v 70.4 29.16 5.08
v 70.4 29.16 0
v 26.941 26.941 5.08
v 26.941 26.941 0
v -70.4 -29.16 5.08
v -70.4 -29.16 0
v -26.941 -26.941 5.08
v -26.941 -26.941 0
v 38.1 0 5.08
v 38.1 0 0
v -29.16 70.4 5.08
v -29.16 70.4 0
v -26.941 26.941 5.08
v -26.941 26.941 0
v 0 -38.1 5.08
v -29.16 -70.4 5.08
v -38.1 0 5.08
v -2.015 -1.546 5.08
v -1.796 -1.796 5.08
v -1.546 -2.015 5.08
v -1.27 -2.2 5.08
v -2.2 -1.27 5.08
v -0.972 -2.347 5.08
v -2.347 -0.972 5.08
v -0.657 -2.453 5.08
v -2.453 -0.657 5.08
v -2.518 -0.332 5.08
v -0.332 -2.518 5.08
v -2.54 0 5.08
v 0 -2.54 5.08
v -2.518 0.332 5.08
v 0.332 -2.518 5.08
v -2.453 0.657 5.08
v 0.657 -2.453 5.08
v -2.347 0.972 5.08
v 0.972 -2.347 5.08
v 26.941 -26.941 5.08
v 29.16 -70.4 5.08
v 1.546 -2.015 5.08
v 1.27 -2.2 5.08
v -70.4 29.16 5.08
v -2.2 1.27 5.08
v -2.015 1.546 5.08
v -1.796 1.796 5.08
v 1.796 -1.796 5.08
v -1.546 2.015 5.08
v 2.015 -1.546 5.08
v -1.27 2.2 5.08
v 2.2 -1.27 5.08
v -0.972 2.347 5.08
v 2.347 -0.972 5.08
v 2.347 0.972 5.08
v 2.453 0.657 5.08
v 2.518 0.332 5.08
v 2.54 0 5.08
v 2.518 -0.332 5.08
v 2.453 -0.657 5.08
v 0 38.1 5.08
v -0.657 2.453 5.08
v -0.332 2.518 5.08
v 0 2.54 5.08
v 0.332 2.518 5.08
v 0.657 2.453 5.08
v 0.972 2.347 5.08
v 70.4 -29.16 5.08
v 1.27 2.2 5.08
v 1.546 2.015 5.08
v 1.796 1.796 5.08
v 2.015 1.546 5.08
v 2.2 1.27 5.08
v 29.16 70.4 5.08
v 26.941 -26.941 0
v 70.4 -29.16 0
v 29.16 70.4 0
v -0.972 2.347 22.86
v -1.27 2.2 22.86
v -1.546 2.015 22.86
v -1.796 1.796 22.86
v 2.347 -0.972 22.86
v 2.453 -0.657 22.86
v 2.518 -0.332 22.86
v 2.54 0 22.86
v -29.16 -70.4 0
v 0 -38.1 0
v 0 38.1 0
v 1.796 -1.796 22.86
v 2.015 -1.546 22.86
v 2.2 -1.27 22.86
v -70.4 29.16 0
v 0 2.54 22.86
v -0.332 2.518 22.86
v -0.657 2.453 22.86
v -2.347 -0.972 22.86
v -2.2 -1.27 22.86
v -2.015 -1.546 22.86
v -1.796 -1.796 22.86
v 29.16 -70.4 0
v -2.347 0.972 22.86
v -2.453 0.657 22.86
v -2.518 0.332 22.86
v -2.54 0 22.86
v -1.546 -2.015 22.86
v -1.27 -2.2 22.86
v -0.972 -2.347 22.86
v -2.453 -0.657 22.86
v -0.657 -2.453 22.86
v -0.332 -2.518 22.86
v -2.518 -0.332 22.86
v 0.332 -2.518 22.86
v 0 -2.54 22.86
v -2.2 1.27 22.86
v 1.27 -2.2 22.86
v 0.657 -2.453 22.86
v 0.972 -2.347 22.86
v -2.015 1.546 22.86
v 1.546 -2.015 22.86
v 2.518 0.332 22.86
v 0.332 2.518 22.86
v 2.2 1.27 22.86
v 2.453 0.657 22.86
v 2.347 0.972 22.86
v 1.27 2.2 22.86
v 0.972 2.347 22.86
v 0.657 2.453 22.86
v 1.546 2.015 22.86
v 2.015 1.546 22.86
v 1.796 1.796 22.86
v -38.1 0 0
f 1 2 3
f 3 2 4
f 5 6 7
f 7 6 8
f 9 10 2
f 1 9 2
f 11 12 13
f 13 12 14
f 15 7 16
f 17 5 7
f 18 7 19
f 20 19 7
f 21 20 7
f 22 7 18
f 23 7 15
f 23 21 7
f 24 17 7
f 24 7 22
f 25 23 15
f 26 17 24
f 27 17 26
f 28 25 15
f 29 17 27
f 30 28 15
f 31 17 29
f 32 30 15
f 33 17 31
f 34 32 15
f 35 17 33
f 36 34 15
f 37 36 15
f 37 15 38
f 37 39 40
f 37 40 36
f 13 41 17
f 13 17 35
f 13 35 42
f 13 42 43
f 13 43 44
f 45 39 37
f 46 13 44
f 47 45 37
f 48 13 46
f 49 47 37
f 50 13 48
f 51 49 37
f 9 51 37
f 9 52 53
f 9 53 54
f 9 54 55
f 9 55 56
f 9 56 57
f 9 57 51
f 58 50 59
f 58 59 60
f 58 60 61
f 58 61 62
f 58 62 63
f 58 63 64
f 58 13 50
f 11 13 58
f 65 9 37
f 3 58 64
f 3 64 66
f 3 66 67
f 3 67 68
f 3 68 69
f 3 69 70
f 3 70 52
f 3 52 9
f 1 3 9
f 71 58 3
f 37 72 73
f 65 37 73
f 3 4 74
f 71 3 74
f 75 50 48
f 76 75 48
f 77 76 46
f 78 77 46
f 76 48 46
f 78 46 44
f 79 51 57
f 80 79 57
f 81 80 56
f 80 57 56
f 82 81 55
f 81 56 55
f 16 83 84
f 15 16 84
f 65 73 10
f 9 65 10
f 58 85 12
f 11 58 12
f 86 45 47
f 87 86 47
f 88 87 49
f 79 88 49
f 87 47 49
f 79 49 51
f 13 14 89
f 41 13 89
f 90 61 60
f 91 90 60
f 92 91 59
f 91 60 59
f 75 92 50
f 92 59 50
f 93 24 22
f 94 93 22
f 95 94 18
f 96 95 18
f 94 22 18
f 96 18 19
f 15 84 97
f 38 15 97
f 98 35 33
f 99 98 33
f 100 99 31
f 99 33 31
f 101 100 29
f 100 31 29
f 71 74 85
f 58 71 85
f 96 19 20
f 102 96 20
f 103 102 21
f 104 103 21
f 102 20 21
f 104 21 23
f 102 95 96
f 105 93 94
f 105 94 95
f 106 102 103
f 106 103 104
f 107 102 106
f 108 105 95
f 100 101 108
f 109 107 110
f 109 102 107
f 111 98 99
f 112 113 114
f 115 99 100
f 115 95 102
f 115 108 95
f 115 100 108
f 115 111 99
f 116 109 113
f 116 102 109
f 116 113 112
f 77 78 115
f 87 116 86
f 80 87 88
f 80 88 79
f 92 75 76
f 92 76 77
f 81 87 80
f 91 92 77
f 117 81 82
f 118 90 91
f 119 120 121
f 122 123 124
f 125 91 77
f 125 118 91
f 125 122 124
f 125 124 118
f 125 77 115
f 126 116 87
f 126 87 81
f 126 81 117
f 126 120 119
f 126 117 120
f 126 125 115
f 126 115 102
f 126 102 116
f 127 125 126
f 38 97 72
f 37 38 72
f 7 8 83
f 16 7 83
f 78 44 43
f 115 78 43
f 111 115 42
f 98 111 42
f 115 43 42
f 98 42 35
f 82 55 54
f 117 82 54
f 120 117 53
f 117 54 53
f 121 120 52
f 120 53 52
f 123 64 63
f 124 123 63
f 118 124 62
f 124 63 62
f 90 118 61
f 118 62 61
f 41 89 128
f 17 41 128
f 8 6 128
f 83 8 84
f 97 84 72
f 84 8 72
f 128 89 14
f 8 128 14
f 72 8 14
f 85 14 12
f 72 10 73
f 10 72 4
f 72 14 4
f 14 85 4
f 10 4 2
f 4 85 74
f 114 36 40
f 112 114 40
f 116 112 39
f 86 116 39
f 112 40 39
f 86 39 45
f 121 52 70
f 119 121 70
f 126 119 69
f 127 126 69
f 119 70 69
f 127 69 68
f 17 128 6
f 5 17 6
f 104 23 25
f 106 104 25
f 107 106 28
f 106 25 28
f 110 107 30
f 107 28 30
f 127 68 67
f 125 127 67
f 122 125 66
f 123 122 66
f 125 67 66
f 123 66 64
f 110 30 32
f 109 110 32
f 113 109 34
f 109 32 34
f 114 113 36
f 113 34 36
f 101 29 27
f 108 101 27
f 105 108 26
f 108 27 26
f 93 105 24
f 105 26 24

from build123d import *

# Parameters (mm, degrees)
F1_DEPTH = 5.08
F2_DEPTH = 22.86


# Not quite as in the source:
# - a feature names something its author has since deleted; it is built from what else it names


with BuildPart() as f1:
    # F0 (on Top) → F1 (new body)
    with BuildSketch(Plane.XY):
        with BuildLine():
            Line((-70.3996203774, -29.1604775462), (-26.9407683632, -26.9407683632))
            ThreePointArc((-26.9407683632, -26.9407683632), (-31.6789922287, -21.167225878), (-35.1998101887, -14.5802387731))
            Line((-35.1998101887, -14.5802387731), (-70.3996203774, -29.1604775462))
        make_face()
        with BuildLine():
            ThreePointArc((-35.1998101887, -14.5802387731), (-37.3679191834, -7.4329412688), (-38.1, 0))
            Line((-38.1, 0), (-70.3996203774, -29.1604775462))
            Line((-70.3996203774, -29.1604775462), (-35.1998101887, -14.5802387731))
        make_face()
        with BuildLine():
            Line((-70.3996203774, 29.1604775462), (-38.1, 0))
            ThreePointArc((-38.1, 0), (-37.3679191834, 7.4329412688), (-35.1998101887, 14.5802387731))
            Line((-35.1998101887, 14.5802387731), (-70.3996203774, 29.1604775462))
        make_face()
        with BuildLine():
            ThreePointArc((-35.1998101887, 14.5802387731), (-31.6789922287, 21.167225878), (-26.9407683632, 26.9407683632))
            Line((-26.9407683632, 26.9407683632), (-70.3996203774, 29.1604775462))
            Line((-70.3996203774, 29.1604775462), (-35.1998101887, 14.5802387731))
        make_face()
        with BuildLine():
            Line((-14.5802387731, 35.1998101887), (-29.1604775462, 70.3996203774))
            Line((-29.1604775462, 70.3996203774), (-26.9407683632, 26.9407683632))
            ThreePointArc((-26.9407683632, 26.9407683632), (-21.167225878, 31.6789922287), (-14.5802387731, 35.1998101887))
        make_face()
        with BuildLine():
            ThreePointArc((-14.5802387731, 35.1998101887), (-7.4329412688, 37.3679191834), (0, 38.1))
            Line((0, 38.1), (-29.1604775462, 70.3996203774))
            Line((-29.1604775462, 70.3996203774), (-14.5802387731, 35.1998101887))
        make_face()
        with BuildLine():
            Line((14.5802387731, 35.1998101887), (29.1604775462, 70.3996203774))
            Line((29.1604775462, 70.3996203774), (0, 38.1))
            ThreePointArc((0, 38.1), (7.4329412688, 37.3679191834), (14.5802387731, 35.1998101887))
        make_face()
        with BuildLine():
            ThreePointArc((14.5802387731, 35.1998101887), (21.167225878, 31.6789922287), (26.9407683632, 26.9407683632))
            Line((26.9407683632, 26.9407683632), (29.1604775462, 70.3996203774))
            Line((29.1604775462, 70.3996203774), (14.5802387731, 35.1998101887))
        make_face()
        with BuildLine():
            Line((38.1, 0), (70.3996203774, 29.1604775462))
            Line((70.3996203774, 29.1604775462), (35.1998101887, 14.5802387731))
            ThreePointArc((35.1998101887, 14.5802387731), (37.3679191834, 7.4329412688), (38.1, 0))
        make_face()
        with BuildLine():
            Line((35.1998101887, -14.5802387731), (70.3996203774, -29.1604775462))
            Line((70.3996203774, -29.1604775462), (38.1, 0))
            ThreePointArc((38.1, 0), (37.3679191834, -7.4329412688), (35.1998101887, -14.5802387731))
        make_face()
        with BuildLine():
            Line((26.9407683632, -26.9407683632), (70.3996203774, -29.1604775462))
            Line((70.3996203774, -29.1604775462), (35.1998101887, -14.5802387731))
            ThreePointArc((35.1998101887, -14.5802387731), (31.6789922287, -21.167225878), (26.9407683632, -26.9407683632))
        make_face()
        with BuildLine():
            Line((29.1604775462, -70.3996203774), (26.9407683632, -26.9407683632))
            ThreePointArc((26.9407683632, -26.9407683632), (21.167225878, -31.6789922287), (14.5802387731, -35.1998101887))
            Line((14.5802387731, -35.1998101887), (29.1604775462, -70.3996203774))
        make_face()
        with BuildLine():
            Line((0, -38.1), (29.1604775462, -70.3996203774))
            Line((29.1604775462, -70.3996203774), (14.5802387731, -35.1998101887))
            ThreePointArc((14.5802387731, -35.1998101887), (7.4329412688, -37.3679191834), (0, -38.1))
        make_face()
        with BuildLine():
            Line((-29.1604775462, -70.3996203774), (0, -38.1))
            ThreePointArc((0, -38.1), (-7.4329412688, -37.3679191834), (-14.5802387731, -35.1998101887))
            Line((-14.5802387731, -35.1998101887), (-29.1604775462, -70.3996203774))
        make_face()
        with BuildLine():
            Line((-26.9407683632, -26.9407683632), (-29.1604775462, -70.3996203774))
            Line((-29.1604775462, -70.3996203774), (-14.5802387731, -35.1998101887))
            ThreePointArc((-14.5802387731, -35.1998101887), (-21.167225878, -31.6789922287), (-26.9407683632, -26.9407683632))
        make_face()
        with BuildLine():
            ThreePointArc((-0.9720159182, -2.3466540126), (-1.4111483919, -2.1119328152), (-1.7960512242, -1.7960512242))
            Line((-1.7960512242, -1.7960512242), (-26.9407683632, -26.9407683632))
            ThreePointArc((-26.9407683632, -26.9407683632), (-21.167225878, -31.6789922287), (-14.5802387731, -35.1998101887))
            Line((-14.5802387731, -35.1998101887), (-0.9720159182, -2.3466540126))
        make_face()
        with BuildLine():
            ThreePointArc((-14.5802387731, -35.1998101887), (-7.4329412688, -37.3679191834), (0, -38.1))
            Line((0, -38.1), (0, -2.54))
            ThreePointArc((0, -2.54), (-0.4955294179, -2.4911946122), (-0.9720159182, -2.3466540126))
            Line((-0.9720159182, -2.3466540126), (-14.5802387731, -35.1998101887))
        make_face()
        with BuildLine():
            ThreePointArc((0, -38.1), (7.4329412688, -37.3679191834), (14.5802387731, -35.1998101887))
            Line((14.5802387731, -35.1998101887), (0.9720159182, -2.3466540126))
            ThreePointArc((0.9720159182, -2.3466540126), (0.4955294179, -2.4911946122), (0, -2.54))
            Line((0, -2.54), (0, -38.1))
        make_face()
        with BuildLine():
            ThreePointArc((14.5802387731, -35.1998101887), (21.167225878, -31.6789922287), (26.9407683632, -26.9407683632))
            Line((26.9407683632, -26.9407683632), (1.7960512242, -1.7960512242))
            ThreePointArc((1.7960512242, -1.7960512242), (1.4111483919, -2.1119328152), (0.9720159182, -2.3466540126))
            Line((0.9720159182, -2.3466540126), (14.5802387731, -35.1998101887))
        make_face()
        with BuildLine():
            ThreePointArc((26.9407683632, -26.9407683632), (31.6789922287, -21.167225878), (35.1998101887, -14.5802387731))
            Line((35.1998101887, -14.5802387731), (2.3466540126, -0.9720159182))
            ThreePointArc((2.3466540126, -0.9720159182), (2.1119328152, -1.4111483919), (1.7960512242, -1.7960512242))
            Line((1.7960512242, -1.7960512242), (26.9407683632, -26.9407683632))
        make_face()
        with BuildLine():
            ThreePointArc((35.1998101887, -14.5802387731), (37.3679191834, -7.4329412688), (38.1, 0))
            Line((38.1, 0), (2.54, 0))
            ThreePointArc((2.54, 0), (2.4911946122, -0.4955294179), (2.3466540126, -0.9720159182))
            Line((2.3466540126, -0.9720159182), (35.1998101887, -14.5802387731))
        make_face()
        with BuildLine():
            Line((2.54, 0), (38.1, 0))
            ThreePointArc((38.1, 0), (37.3679191834, 7.4329412688), (35.1998101887, 14.5802387731))
            Line((35.1998101887, 14.5802387731), (2.3466540126, 0.9720159182))
            ThreePointArc((2.3466540126, 0.9720159182), (2.4911946122, 0.4955294179), (2.54, 0))
        make_face()
        with BuildLine():
            Line((2.3466540126, 0.9720159182), (35.1998101887, 14.5802387731))
            ThreePointArc((35.1998101887, 14.5802387731), (31.6789922287, 21.167225878), (26.9407683632, 26.9407683632))
            Line((26.9407683632, 26.9407683632), (1.7960512242, 1.7960512242))
            ThreePointArc((1.7960512242, 1.7960512242), (2.1119328152, 1.4111483919), (2.3466540126, 0.9720159182))
        make_face()
        with BuildLine():
            Line((1.7960512242, 1.7960512242), (26.9407683632, 26.9407683632))
            ThreePointArc((26.9407683632, 26.9407683632), (21.167225878, 31.6789922287), (14.5802387731, 35.1998101887))
            Line((14.5802387731, 35.1998101887), (0.9720159182, 2.3466540126))
            ThreePointArc((0.9720159182, 2.3466540126), (1.4111483919, 2.1119328152), (1.7960512242, 1.7960512242))
        make_face()
        with BuildLine():
            Line((0.9720159182, 2.3466540126), (14.5802387731, 35.1998101887))
            ThreePointArc((14.5802387731, 35.1998101887), (7.4329412688, 37.3679191834), (0, 38.1))
            Line((0, 38.1), (0, 2.54))
            ThreePointArc((0, 2.54), (0.4955294179, 2.4911946122), (0.9720159182, 2.3466540126))
        make_face()
        with BuildLine():
            Line((0, 2.54), (0, 38.1))
            ThreePointArc((0, 38.1), (-7.4329412688, 37.3679191834), (-14.5802387731, 35.1998101887))
            Line((-14.5802387731, 35.1998101887), (-0.9720159182, 2.3466540126))
            ThreePointArc((-0.9720159182, 2.3466540126), (-0.4955294179, 2.4911946122), (0, 2.54))
        make_face()
        with BuildLine():
            Line((-26.9407683632, 26.9407683632), (-1.7960512242, 1.7960512242))
            ThreePointArc((-1.7960512242, 1.7960512242), (-1.4111483919, 2.1119328152), (-0.9720159182, 2.3466540126))
            Line((-0.9720159182, 2.3466540126), (-14.5802387731, 35.1998101887))
            ThreePointArc((-14.5802387731, 35.1998101887), (-21.167225878, 31.6789922287), (-26.9407683632, 26.9407683632))
        make_face()
        with BuildLine():
            ThreePointArc((-2.3466540126, 0.9720159182), (-2.1119328152, 1.4111483919), (-1.7960512242, 1.7960512242))
            Line((-1.7960512242, 1.7960512242), (-26.9407683632, 26.9407683632))
            ThreePointArc((-26.9407683632, 26.9407683632), (-31.6789922287, 21.167225878), (-35.1998101887, 14.5802387731))
            Line((-35.1998101887, 14.5802387731), (-2.3466540126, 0.9720159182))
        make_face()
        with BuildLine():
            Line((-38.1, 0), (-2.54, 0))
            ThreePointArc((-2.54, 0), (-2.4911946122, 0.4955294179), (-2.3466540126, 0.9720159182))
            Line((-2.3466540126, 0.9720159182), (-35.1998101887, 14.5802387731))
            ThreePointArc((-35.1998101887, 14.5802387731), (-37.3679191834, 7.4329412688), (-38.1, 0))
        make_face()
        with BuildLine():
            ThreePointArc((-2.3466540126, -0.9720159182), (-2.4911946122, -0.4955294179), (-2.54, 0))
            Line((-2.54, 0), (-38.1, 0))
            ThreePointArc((-38.1, 0), (-37.3679191834, -7.4329412688), (-35.1998101887, -14.5802387731))
            Line((-35.1998101887, -14.5802387731), (-2.3466540126, -0.9720159182))
        make_face()
        with BuildLine():
            Line((-26.9407683632, -26.9407683632), (-1.7960512242, -1.7960512242))
            ThreePointArc((-1.7960512242, -1.7960512242), (-2.1119328152, -1.4111483919), (-2.3466540126, -0.9720159182))
            Line((-2.3466540126, -0.9720159182), (-35.1998101887, -14.5802387731))
            ThreePointArc((-35.1998101887, -14.5802387731), (-31.6789922287, -21.167225878), (-26.9407683632, -26.9407683632))
        make_face()
        with BuildLine():
            Line((35.1998101887, 14.5802387731), (70.3996203774, 29.1604775462))
            Line((70.3996203774, 29.1604775462), (26.9407683632, 26.9407683632))
            ThreePointArc((26.9407683632, 26.9407683632), (31.6789922287, 21.167225878), (35.1998101887, 14.5802387731))
        make_face()
    extrude(amount=F1_DEPTH)

    # F0 (on Top) → F2 (join)
    with BuildSketch(Plane.XY):
        with BuildLine():
            Line((-1.7960512242, 1.7960512242), (0, 0))
            Line((0, 0), (-0.9720159182, 2.3466540126))
            ThreePointArc((-0.9720159182, 2.3466540126), (-1.4111483919, 2.1119328152), (-1.7960512242, 1.7960512242))
        make_face()
        with BuildLine():
            Line((-2.3466540126, 0.9720159182), (0, 0))
            Line((0, 0), (-1.7960512242, 1.7960512242))
            ThreePointArc((-1.7960512242, 1.7960512242), (-2.1119328152, 1.4111483919), (-2.3466540126, 0.9720159182))
        make_face()
        with BuildLine():
            Line((-2.54, 0), (0, 0))
            Line((0, 0), (-2.3466540126, 0.9720159182))
            ThreePointArc((-2.3466540126, 0.9720159182), (-2.4911946122, 0.4955294179), (-2.54, 0))
        make_face()
        with BuildLine():
            Line((-2.3466540126, -0.9720159182), (0, 0))
            Line((0, 0), (-2.54, 0))
            ThreePointArc((-2.54, 0), (-2.4911946122, -0.4955294179), (-2.3466540126, -0.9720159182))
        make_face()
        with BuildLine():
            Line((-1.7960512242, -1.7960512242), (0, 0))
            Line((0, 0), (-2.3466540126, -0.9720159182))
            ThreePointArc((-2.3466540126, -0.9720159182), (-2.1119328152, -1.4111483919), (-1.7960512242, -1.7960512242))
        make_face()
        with BuildLine():
            Line((-0.9720159182, -2.3466540126), (0, 0))
            Line((0, 0), (-1.7960512242, -1.7960512242))
            ThreePointArc((-1.7960512242, -1.7960512242), (-1.4111483919, -2.1119328152), (-0.9720159182, -2.3466540126))
        make_face()
        with BuildLine():
            Line((0, -2.54), (0, 0))
            Line((0, 0), (-0.9720159182, -2.3466540126))
            ThreePointArc((-0.9720159182, -2.3466540126), (-0.4955294179, -2.4911946122), (0, -2.54))
        make_face()
        with BuildLine():
            Line((0.9720159182, -2.3466540126), (0, 0))
            Line((0, 0), (0, -2.54))
            ThreePointArc((0, -2.54), (0.4955294179, -2.4911946122), (0.9720159182, -2.3466540126))
        make_face()
        with BuildLine():
            ThreePointArc((0.9720159182, -2.3466540126), (1.4111483919, -2.1119328152), (1.7960512242, -1.7960512242))
            Line((1.7960512242, -1.7960512242), (0, 0))
            Line((0, 0), (0.9720159182, -2.3466540126))
        make_face()
        with BuildLine():
            ThreePointArc((1.7960512242, -1.7960512242), (2.1119328152, -1.4111483919), (2.3466540126, -0.9720159182))
            Line((2.3466540126, -0.9720159182), (0, 0))
            Line((0, 0), (1.7960512242, -1.7960512242))
        make_face()
        with BuildLine():
            ThreePointArc((2.3466540126, -0.9720159182), (2.4911946122, -0.4955294179), (2.54, 0))
            Line((2.54, 0), (0, 0))
            Line((0, 0), (2.3466540126, -0.9720159182))
        make_face()
        with BuildLine():
            Line((0, 0), (2.54, 0))
            ThreePointArc((2.54, 0), (2.4911946122, 0.4955294179), (2.3466540126, 0.9720159182))
            Line((2.3466540126, 0.9720159182), (0, 0))
        make_face()
        with BuildLine():
            Line((0, 0), (2.3466540126, 0.9720159182))
            ThreePointArc((2.3466540126, 0.9720159182), (2.1119328152, 1.4111483919), (1.7960512242, 1.7960512242))
            Line((1.7960512242, 1.7960512242), (0, 0))
        make_face()
        with BuildLine():
            Line((0, 2.54), (0, 0))
            Line((0, 0), (0.9720159182, 2.3466540126))
            ThreePointArc((0.9720159182, 2.3466540126), (0.4955294179, 2.4911946122), (0, 2.54))
        make_face()
        with BuildLine():
            Line((-0.9720159182, 2.3466540126), (0, 0))
            Line((0, 0), (0, 2.54))
            ThreePointArc((0, 2.54), (-0.4955294179, 2.4911946122), (-0.9720159182, 2.3466540126))
        make_face()
        with BuildLine():
            Line((0, 0), (1.7960512242, 1.7960512242))
            ThreePointArc((1.7960512242, 1.7960512242), (1.4111483919, 2.1119328152), (0.9720159182, 2.3466540126))
            Line((0.9720159182, 2.3466540126), (0, 0))
        make_face()
    extrude(amount=F2_DEPTH)


solid = f1.part
